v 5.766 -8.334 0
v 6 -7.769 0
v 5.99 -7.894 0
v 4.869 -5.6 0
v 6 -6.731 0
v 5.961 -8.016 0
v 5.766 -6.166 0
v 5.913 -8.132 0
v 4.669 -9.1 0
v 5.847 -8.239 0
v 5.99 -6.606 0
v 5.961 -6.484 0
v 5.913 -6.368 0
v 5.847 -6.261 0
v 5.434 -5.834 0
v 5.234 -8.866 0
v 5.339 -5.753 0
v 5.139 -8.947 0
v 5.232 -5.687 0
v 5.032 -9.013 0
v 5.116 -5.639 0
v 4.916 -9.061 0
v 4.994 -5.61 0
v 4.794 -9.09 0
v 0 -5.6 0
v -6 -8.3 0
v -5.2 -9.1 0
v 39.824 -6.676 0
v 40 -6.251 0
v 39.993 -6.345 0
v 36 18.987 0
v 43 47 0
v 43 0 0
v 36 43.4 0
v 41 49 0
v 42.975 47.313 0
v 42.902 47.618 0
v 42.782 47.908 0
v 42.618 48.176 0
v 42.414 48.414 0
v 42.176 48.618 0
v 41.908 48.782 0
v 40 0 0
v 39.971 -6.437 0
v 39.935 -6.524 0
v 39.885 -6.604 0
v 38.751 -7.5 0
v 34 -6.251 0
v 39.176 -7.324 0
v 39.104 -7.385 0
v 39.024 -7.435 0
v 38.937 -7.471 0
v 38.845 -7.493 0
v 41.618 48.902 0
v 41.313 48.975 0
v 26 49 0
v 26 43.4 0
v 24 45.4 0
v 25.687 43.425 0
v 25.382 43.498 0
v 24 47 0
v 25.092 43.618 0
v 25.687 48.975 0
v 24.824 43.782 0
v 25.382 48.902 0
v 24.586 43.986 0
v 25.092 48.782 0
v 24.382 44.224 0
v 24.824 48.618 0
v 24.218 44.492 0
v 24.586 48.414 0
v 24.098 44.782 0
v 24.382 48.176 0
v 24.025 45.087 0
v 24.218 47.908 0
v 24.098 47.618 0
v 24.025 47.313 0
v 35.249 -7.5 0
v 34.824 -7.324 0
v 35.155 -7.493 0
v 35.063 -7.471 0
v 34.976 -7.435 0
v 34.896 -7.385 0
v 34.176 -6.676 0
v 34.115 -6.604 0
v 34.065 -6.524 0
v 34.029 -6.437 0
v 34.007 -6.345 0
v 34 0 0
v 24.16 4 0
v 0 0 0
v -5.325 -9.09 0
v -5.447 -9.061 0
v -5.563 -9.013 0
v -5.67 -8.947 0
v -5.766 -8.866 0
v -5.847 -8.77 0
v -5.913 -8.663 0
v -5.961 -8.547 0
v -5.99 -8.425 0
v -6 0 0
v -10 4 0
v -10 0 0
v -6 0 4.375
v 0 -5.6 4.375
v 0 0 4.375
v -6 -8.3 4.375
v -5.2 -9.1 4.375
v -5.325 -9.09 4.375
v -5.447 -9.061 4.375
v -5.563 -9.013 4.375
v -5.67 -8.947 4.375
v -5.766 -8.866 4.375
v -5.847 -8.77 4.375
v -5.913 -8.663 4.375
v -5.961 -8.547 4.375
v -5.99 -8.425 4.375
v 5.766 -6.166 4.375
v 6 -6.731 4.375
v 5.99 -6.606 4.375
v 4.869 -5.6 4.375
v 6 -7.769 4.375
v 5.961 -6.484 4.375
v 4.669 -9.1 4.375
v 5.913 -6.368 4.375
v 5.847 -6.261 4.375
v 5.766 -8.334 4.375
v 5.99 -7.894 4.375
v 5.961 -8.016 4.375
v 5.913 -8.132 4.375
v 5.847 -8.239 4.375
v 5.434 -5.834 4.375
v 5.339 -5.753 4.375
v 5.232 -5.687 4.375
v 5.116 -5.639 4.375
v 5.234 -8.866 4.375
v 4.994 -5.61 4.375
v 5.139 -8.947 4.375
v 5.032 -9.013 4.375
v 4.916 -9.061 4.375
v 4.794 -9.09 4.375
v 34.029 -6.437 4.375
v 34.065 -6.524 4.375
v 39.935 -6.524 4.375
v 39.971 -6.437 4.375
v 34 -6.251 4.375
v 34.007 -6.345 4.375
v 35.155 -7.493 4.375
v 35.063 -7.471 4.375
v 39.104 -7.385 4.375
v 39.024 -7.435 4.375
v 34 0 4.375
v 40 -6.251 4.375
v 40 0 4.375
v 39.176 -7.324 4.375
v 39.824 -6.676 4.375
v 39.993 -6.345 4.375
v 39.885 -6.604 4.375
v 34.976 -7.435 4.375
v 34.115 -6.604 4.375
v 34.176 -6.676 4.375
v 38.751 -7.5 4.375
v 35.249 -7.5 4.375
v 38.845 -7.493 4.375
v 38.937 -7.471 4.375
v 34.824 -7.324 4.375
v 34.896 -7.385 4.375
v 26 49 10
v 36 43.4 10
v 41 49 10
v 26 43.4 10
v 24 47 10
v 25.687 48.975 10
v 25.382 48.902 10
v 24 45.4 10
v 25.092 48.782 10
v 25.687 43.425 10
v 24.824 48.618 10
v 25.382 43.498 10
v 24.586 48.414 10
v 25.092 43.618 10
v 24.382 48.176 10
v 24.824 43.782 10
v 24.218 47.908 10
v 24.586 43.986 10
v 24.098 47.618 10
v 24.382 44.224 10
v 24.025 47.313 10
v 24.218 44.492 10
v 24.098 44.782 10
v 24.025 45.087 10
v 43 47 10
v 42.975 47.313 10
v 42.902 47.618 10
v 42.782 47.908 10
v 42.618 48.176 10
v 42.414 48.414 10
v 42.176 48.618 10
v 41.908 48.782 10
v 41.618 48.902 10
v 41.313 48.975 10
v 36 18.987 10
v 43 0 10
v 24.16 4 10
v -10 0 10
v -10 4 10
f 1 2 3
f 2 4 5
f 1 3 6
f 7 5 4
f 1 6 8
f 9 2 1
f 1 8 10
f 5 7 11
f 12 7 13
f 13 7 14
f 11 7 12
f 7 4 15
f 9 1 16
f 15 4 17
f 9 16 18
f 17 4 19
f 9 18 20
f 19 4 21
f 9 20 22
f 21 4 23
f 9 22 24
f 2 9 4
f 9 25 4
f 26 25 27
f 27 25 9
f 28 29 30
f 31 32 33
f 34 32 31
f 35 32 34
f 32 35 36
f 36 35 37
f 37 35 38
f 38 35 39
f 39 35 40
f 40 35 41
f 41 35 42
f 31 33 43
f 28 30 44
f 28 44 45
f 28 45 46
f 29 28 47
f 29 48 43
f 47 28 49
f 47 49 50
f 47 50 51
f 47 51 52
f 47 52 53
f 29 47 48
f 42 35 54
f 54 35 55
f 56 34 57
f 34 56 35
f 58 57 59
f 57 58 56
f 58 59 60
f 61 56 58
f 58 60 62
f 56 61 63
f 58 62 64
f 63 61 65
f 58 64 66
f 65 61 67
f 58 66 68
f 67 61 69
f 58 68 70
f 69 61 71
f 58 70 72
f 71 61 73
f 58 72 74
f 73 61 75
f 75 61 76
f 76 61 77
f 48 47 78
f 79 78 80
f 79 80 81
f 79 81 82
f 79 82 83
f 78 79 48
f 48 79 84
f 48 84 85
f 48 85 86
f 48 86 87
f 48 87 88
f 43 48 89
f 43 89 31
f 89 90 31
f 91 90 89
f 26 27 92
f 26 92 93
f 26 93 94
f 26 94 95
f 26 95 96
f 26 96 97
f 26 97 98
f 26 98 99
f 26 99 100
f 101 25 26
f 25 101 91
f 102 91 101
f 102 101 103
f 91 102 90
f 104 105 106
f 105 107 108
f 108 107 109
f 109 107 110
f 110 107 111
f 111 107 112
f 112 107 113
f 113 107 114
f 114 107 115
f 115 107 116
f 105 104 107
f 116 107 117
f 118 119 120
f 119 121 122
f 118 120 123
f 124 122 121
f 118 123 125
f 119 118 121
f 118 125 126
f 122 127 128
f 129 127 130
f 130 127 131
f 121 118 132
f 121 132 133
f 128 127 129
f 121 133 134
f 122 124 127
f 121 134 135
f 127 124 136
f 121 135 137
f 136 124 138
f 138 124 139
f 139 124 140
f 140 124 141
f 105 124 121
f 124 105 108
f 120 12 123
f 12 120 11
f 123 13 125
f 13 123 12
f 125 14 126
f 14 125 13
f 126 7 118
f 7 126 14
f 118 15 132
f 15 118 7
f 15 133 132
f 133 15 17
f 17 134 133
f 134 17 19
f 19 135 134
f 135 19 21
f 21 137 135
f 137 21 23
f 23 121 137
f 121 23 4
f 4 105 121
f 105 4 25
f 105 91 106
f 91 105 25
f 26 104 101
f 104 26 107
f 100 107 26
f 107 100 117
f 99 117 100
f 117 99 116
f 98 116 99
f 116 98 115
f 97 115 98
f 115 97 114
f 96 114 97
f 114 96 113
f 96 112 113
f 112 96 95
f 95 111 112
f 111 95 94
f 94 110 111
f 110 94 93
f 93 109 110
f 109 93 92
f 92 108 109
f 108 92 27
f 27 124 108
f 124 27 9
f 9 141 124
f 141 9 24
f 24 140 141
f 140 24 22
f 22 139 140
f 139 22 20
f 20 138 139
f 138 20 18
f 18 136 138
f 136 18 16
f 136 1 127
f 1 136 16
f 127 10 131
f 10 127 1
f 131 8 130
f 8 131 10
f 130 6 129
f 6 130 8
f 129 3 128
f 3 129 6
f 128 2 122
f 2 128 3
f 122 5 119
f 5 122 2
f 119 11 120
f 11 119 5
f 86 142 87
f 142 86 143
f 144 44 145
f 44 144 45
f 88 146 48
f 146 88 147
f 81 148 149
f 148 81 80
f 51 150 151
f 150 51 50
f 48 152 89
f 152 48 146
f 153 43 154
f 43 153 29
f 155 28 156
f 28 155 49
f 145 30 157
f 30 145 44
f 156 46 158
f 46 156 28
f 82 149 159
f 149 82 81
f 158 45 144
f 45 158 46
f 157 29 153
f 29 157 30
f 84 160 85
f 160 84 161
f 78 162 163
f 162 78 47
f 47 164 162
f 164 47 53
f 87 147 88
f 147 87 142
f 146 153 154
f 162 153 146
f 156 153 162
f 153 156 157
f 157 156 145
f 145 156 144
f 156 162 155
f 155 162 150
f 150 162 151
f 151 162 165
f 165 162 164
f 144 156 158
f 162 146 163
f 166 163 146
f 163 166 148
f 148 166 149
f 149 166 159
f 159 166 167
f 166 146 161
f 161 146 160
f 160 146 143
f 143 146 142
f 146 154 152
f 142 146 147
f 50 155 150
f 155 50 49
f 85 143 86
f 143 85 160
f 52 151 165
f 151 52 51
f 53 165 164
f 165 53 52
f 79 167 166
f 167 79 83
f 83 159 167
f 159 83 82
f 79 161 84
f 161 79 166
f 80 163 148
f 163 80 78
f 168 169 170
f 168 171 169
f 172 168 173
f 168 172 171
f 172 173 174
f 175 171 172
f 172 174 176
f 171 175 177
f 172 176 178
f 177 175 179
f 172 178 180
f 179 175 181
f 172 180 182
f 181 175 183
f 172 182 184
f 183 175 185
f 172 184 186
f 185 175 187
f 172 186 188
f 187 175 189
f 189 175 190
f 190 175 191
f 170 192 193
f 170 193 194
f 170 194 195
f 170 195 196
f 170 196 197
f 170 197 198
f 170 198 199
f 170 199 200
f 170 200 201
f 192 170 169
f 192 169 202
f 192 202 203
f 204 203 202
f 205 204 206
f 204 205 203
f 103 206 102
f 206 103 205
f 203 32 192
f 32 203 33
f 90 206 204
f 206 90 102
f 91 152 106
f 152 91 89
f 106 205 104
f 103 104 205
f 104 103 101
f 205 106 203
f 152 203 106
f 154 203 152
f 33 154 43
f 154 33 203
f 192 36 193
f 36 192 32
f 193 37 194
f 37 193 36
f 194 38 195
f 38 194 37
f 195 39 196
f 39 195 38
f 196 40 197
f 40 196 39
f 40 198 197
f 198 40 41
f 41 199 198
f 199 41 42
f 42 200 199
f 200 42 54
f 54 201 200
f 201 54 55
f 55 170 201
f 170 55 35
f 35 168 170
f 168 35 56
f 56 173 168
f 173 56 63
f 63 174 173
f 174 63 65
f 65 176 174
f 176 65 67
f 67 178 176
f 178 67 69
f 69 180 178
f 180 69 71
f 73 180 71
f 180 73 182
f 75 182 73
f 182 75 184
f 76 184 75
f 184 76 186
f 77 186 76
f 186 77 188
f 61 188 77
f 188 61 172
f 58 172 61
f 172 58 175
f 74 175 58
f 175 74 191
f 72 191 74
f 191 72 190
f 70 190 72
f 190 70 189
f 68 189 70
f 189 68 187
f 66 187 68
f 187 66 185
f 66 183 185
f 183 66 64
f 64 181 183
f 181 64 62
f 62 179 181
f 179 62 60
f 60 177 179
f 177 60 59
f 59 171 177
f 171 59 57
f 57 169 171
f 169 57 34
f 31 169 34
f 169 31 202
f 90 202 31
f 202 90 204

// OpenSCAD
// Pegboard & SKÅDIS Accessory Generator for 3D printing
// https://mrvarity.com/apps/openscad/g/pegboard-hook/
//
// Hooks, double hooks, shelves with a lip, tool ring holders and bins for
// IKEA SKÅDIS boards (5 x 15 mm slots, 40 mm apart) and classic pegboard
// (1/4 in holes on a 1 in grid, or 6 mm holes on a 25 mm grid). The top tab
// drops into the board and hooks behind it, a straight peg one row lower
// stops the part from swinging, and an optional lock keeps it from being
// knocked off. Laid on its side for printing, so hooks need no supports.
//
// IKEA and SKÅDIS are trademarks of Inter IKEA Systems B.V., which is not
// affiliated with and does not endorse this generator.
//
// MIT License, (c) 2026 Eugene Vasenev / mrvarity.com

/* [Board] */
// Which board the accessory hangs on
board = "skadis"; // [skadis:IKEA SKÅDIS (5 x 15 mm slots), pegboard:Pegboard 1/4 in holes on 1 in grid, pegboard_metric:Pegboard 6 mm holes on 25 mm grid]
// Board thickness (mm). 0 = automatic: 5 for SKÅDIS and metric, 6.35 (1/4 in) for imperial pegboard
board_thickness = 0; // [0:0.5:10]
// Gap between the tabs and the board on each side (mm). Raise if the tabs are too tight
fit_clearance = 0.3; // [0.1:0.05:0.8]
// Lock: SKÅDIS gets a small plug that fills the slot above the hook; pegboard gets a snap-in lower pin
lock_peg = false;

/* [Item] */
// What to make
item = "hook"; // [hook:Single hook, double_hook:Double hook (two prongs), shelf:Shelf / tray with lip, ring_holder:Ring holder for tools, bin:Cup / bin]
// Width counted in slots or holes: the part gets a pair of tabs in each of them
width_units = 1; // [1:1:8]
// Thickness of the wall that rests on the board (mm)
back_thickness = 4; // [2:0.5:8]

/* [Hook] */
// How far the hook reaches out from the board (mm)
hook_reach = 45; // [10:1:150]
// Height of the upturned tip at the end of the hook (mm, 0 = straight)
hook_tip_height = 12; // [0:1:40]
// Thickness of the hook arm, top to bottom (mm)
hook_thickness = 7; // [4:0.5:15]
// Width of each hook prong (mm)
hook_width = 10; // [4:1:40]
// Gap between the two prongs of a double hook (mm)
prong_gap = 20; // [5:1:100]

/* [Shelf and bin] */
// Depth from the board to the front edge (mm)
tray_depth = 50; // [15:1:200]
// Height of the front lip of a shelf (mm)
lip_height = 10; // [0:1:60]
// Height of a cup / bin (mm)
bin_height = 45; // [10:1:150]
// Wall and floor thickness (mm)
wall_thickness = 2; // [1.2:0.1:5]
// Close the ends of a shelf with side walls
end_walls = true;

/* [Ring holder] */
// Diameter of each hole (mm)
hole_diameter = 8; // [3:0.5:40]
// Number of holes
hole_count = 6; // [1:1:20]
// Material between neighbouring holes (mm)
hole_spacing = 4; // [1.5:0.5:20]
// Thickness of the plate with the holes (mm)
ring_thickness = 6; // [3:0.5:15]

/* [Printing] */
// Lay the part on its side for printing (strong tabs, hooks need no supports). Off = as it hangs
lay_on_side = true;

/* [Hidden] */
$fn = 40;
eps = 0.01;
skadis = board == "skadis";
metric = board == "pegboard_metric";
BT = board_thickness > 0 ? board_thickness : (board == "pegboard" ? 6.35 : 5);
fit = fit_clearance;
c = 2 * fit;                         // clearance through the board thickness
// SKÅDIS: 5 x 15 mm slots, 40 mm apart in a row, rows 20 mm apart and
// offset by 20 mm, so the slot straight below is 40 mm down
SW = 5;  SH = 15;
HD = metric ? 6 : 6.35;              // pegboard hole diameter
PITCH = skadis ? 40 : (metric ? 25 : 25.4);
VP = PITCH;                          // lower tab: next slot / hole straight below
PD = HD - 2 * fit;                   // pegboard pin diameter
// tab width across the board (pins get flats), kept to 1/8 mm so faces line up exactly
TW = round((skadis ? SW - 2 * fit : PD - 0.8) * 8) / 8;
BP = back_thickness;
AT = 6;                              // SKÅDIS hook tab height
LD = 6;                              // SKÅDIS hook drop behind the board
LT = 3.5;                            // SKÅDIS hook leg thickness
PH = 6;                              // SKÅDIS lower peg height
LU = 7;                              // pegboard L-pin rise behind the board
n = width_units;
span = (n - 1) * PITCH + TW;         // tabs flush with both side faces
WT = wall_thickness;
ring_gap = max(hole_spacing, 3);
W = round(8 * max(span,
        item == "hook" ? hook_width :
        item == "double_hook" ? 2 * hook_width + prong_gap :
        item == "ring_holder" ? hole_count * (hole_diameter + hole_spacing) + hole_spacing :
        30)) / 8;
x_b = -TW / 2;                       // left face, flush with the first tab
LOCK_LO = AT + 0.2;                  // SKÅDIS lock plug, fills the slot above the hook
LOCK_H = SH - AT - 0.6;
ztop = skadis ? (lock_peg ? SH + 3 : AT + 4) : ceil(PD / 2 + LU + 2);
zbot = skadis ? -VP - 3 : floor(-VP - PD / 2 - 3);
ring_depth = 2 * ring_gap + hole_diameter;
depth = item == "hook" || item == "double_hook" ? hook_reach :
        item == "ring_holder" ? ring_depth : tray_depth;

// Use coordinates: board front face at y = 0, the part sits at y > 0, x
// runs along the board, z up. Print coordinates come from this transform.
function P(p) = lay_on_side ? [-p[2], p[1], p[0] - x_b] : [p[0], p[1], p[2] - zbot];
module place() {
  if (lay_on_side) translate([0, 0, -x_b]) rotate([0, -90, 0]) children();
  else translate([0, 0, -zbot]) children();
}

// Dimension bubbles in the web editor: DIM|parameter|label|[x, y, z] anchor
xm = x_b + W / 2;
echo(str("DIM|width_units|", n, skadis ? (n == 1 ? " slot" : " slots") : (n == 1 ? " hole" : " holes"), "|",
         P([xm, BP, ztop])));
if (item == "hook" || item == "double_hook")
  echo(str("DIM|hook_reach|", hook_reach, " mm|", P([xm, BP + hook_reach, zbot + hook_thickness / 2])));
else if (item == "ring_holder")
  echo(str("DIM|hole_diameter|", hole_diameter, " mm|",
           P([x_b + W / hole_count / 2 + hole_diameter / 2, BP + ring_gap + hole_diameter / 2, zbot + ring_thickness])));
else
  echo(str("DIM|tray_depth|", tray_depth, " mm|",
           P([xm, BP + tray_depth, zbot + (item == "bin" ? bin_height : max(lip_height, WT)) / 2])));
if (item == "bin")
  echo(str("DIM|bin_height|", bin_height, " mm|", P([x_b + W, BP + tray_depth, zbot + bin_height / 2])));

// Extrude a 2D profile (u = y, v = z) along x from x0, w wide
module prof(x0, w) { translate([x0, 0, 0]) rotate([90, 0, 90]) linear_extrude(w) children(); }
module round_out(r) { offset(r = r) offset(delta = -r) children(); }

// ---------- tabs ----------
module skadis_hook_tab() {
  prof(-TW / 2, TW) round_out(0.8) polygon([
    [BP / 2, 0], [BP / 2, AT],
    [-(BT + c + LT), AT], [-(BT + c + LT), -LD + 1],
    [-(BT + c + LT) + 1, -LD], [-(BT + c) - 0.8, -LD], [-(BT + c), -LD + 0.8],
    [-(BT + c), 0]]);
}
module skadis_peg() {
  prof(-TW / 2, TW) round_out(0.6) polygon([
    [BP / 2, -VP], [-(BT + 2.5) + 1, -VP], [-(BT + 2.5), -VP + 1],
    [-(BT + 2.5), -VP + PH - 1], [-(BT + 2.5) + 1, -VP + PH], [BP / 2, -VP + PH]]);
}
module flats() { translate([-TW / 2, -50, -50]) cube([TW, 100, 100]); }
module peg_L_pin() {
  yl = -(BT + c + PD / 2);
  intersection() {
    union() {
      hull() {
        translate([0, BP / 2, 0]) rotate([90, 0, 0]) cylinder(h = eps, d = PD);
        translate([0, yl, 0]) sphere(d = PD);
      }
      hull() {
        translate([0, yl, 0]) sphere(d = PD);
        translate([0, yl, LU]) sphere(d = PD);
      }
    }
    flats();
  }
}
// Straight lower pin, turned from one profile; the lock version is split
// and has a barb that clicks behind the board
module peg_straight_pin() {
  L = BT + 2.5;
  r = PD / 2;
  pts = lock_peg
    ? [[0, -BP / 2], [r, -BP / 2], [r, BT + c], [r + 0.45, BT + c], [r - 0.3, L - 0.3], [r - 0.6, L], [0, L]]
    : [[0, -BP / 2], [r, -BP / 2], [r, L - 0.8], [r - 0.6, L], [0, L]];
  intersection() {
    difference() {
      rotate([90, 0, 0]) rotate_extrude() polygon(pts);
      if (lock_peg) translate([-PD, -L - 1, -0.6]) cube([2 * PD, L + 2, 1.2]);
    }
    flats();
  }
}
module tabs() {
  for (k = [0 : n - 1]) translate([k * PITCH, 0, 0]) {
    if (skadis) { skadis_hook_tab(); skadis_peg(); }
    else { peg_L_pin(); translate([0, 0, -VP]) peg_straight_pin(); }
  }
}
module lock_hole() {
  if (skadis && lock_peg) translate([-0.6, -eps, LOCK_LO - 0.1]) cube([3.0, BP + 2 * eps, LOCK_H + 0.2]);
}
// Separate plug, printed head down beside the part
module lock_plug() {
  cube([7, LOCK_H + 4, 1.6]);
  translate([(7 - 2.8) / 2, 2, 0]) cube([2.8, LOCK_H - 0.1, 1.6 + BP + BT + 1]);
}

// ---------- items ----------
module back_plate() { translate([x_b, 0, zbot]) cube([W, BP, ztop - zbot]); }

module hook_profile() {
  ht = hook_thickness;
  tt = max(4, ht * 0.8);
  g = min(hook_reach * 0.4, 15, ztop - zbot - ht - 2);
  union() {
    round_out(min(2, ht / 3)) union() {
      translate([0, zbot]) square([BP + hook_reach, ht]);
      if (hook_tip_height > 0) translate([BP + hook_reach - tt, zbot]) square([tt, ht + hook_tip_height]);
      polygon([[0, zbot + ht - eps], [BP + g, zbot + ht - eps], [0, zbot + ht + g]]);
    }
    // square where the arm meets the back so no slivers form along it
    translate([0, zbot]) square([BP + min(2, hook_reach / 2), ht]);
  }
}
module hooks() {
  if (item == "hook") prof(x_b, W) hook_profile();
  else {
    prof(x_b, hook_width) hook_profile();
    translate([x_b + W, 0, 0]) mirror([1, 0, 0]) prof(0, hook_width) hook_profile();
  }
}

module shelf() {
  ft = max(WT, 2.4);
  prof(x_b, W) round_out(min(0.9, WT / 2.5)) union() {
    translate([0, zbot]) square([BP + tray_depth, ft]);
    translate([BP + tray_depth - WT, zbot]) square([WT, max(ft, lip_height)]);
  }
  if (end_walls && lip_height > ft)
    for (m = [0, 1]) translate([x_b + m * W, 0, 0]) mirror([m, 0, 0]) prof(0, WT) round_out(min(0.9, WT / 2.5))
      polygon([[0, zbot], [BP + tray_depth, zbot], [BP + tray_depth, zbot + lip_height],
               [BP + min(tray_depth, 15), zbot + lip_height], [0, zbot + lip_height + min(tray_depth, 15)]]);
}

module hole2d(d) {
  // teardrop when printed on its side, so the top of the hole needs no support
  if (lay_on_side) union() { circle(d = d); rotate(-45) square(d / 2); }
  else circle(d = d);
}
module ring_holder() {
  rt = ring_thickness;
  difference() {
    prof(x_b, W) offset(r = -2) offset(r = 2) union() {
      translate([0, zbot]) square([BP + ring_depth, rt]);
      translate([-eps, zbot]) square([BP + eps, ztop - zbot]);
    }
    for (i = [0 : hole_count - 1])
      translate([x_b + (i + 0.5) * W / hole_count, BP + ring_gap + hole_diameter / 2, zbot - 1])
        linear_extrude(rt + 2) hole2d(hole_diameter);
  }
}

module bin() {
  r = min(4, tray_depth / 4, W / 4);
  difference() {
    translate([0, 0, zbot]) linear_extrude(bin_height) hull() {
      translate([x_b, 0]) square([W, eps]);
      translate([x_b + r, BP + tray_depth - r]) circle(r = r);
      translate([x_b + W - r, BP + tray_depth - r]) circle(r = r);
    }
    translate([0, 0, zbot + WT]) linear_extrude(bin_height) hull() {
      ri = max(0.5, r - WT);
      translate([x_b + WT, BP]) square([W - 2 * WT, eps]);
      translate([x_b + WT + ri, BP + tray_depth - WT - ri]) circle(r = ri);
      translate([x_b + W - WT - ri, BP + tray_depth - WT - ri]) circle(r = ri);
    }
  }
}

module part() {
  difference() {
    union() {
      back_plate();
      tabs();
      if (item == "hook" || item == "double_hook") hooks();
      else if (item == "shelf") shelf();
      else if (item == "ring_holder") ring_holder();
      else if (item == "bin") bin();
    }
    lock_hole();
  }
}

place() part();
if (skadis && lock_peg)
  translate(lay_on_side ? [-zbot + 8, 0, 0] : [x_b + W + 8, -ztop, 0]) lock_plug();
